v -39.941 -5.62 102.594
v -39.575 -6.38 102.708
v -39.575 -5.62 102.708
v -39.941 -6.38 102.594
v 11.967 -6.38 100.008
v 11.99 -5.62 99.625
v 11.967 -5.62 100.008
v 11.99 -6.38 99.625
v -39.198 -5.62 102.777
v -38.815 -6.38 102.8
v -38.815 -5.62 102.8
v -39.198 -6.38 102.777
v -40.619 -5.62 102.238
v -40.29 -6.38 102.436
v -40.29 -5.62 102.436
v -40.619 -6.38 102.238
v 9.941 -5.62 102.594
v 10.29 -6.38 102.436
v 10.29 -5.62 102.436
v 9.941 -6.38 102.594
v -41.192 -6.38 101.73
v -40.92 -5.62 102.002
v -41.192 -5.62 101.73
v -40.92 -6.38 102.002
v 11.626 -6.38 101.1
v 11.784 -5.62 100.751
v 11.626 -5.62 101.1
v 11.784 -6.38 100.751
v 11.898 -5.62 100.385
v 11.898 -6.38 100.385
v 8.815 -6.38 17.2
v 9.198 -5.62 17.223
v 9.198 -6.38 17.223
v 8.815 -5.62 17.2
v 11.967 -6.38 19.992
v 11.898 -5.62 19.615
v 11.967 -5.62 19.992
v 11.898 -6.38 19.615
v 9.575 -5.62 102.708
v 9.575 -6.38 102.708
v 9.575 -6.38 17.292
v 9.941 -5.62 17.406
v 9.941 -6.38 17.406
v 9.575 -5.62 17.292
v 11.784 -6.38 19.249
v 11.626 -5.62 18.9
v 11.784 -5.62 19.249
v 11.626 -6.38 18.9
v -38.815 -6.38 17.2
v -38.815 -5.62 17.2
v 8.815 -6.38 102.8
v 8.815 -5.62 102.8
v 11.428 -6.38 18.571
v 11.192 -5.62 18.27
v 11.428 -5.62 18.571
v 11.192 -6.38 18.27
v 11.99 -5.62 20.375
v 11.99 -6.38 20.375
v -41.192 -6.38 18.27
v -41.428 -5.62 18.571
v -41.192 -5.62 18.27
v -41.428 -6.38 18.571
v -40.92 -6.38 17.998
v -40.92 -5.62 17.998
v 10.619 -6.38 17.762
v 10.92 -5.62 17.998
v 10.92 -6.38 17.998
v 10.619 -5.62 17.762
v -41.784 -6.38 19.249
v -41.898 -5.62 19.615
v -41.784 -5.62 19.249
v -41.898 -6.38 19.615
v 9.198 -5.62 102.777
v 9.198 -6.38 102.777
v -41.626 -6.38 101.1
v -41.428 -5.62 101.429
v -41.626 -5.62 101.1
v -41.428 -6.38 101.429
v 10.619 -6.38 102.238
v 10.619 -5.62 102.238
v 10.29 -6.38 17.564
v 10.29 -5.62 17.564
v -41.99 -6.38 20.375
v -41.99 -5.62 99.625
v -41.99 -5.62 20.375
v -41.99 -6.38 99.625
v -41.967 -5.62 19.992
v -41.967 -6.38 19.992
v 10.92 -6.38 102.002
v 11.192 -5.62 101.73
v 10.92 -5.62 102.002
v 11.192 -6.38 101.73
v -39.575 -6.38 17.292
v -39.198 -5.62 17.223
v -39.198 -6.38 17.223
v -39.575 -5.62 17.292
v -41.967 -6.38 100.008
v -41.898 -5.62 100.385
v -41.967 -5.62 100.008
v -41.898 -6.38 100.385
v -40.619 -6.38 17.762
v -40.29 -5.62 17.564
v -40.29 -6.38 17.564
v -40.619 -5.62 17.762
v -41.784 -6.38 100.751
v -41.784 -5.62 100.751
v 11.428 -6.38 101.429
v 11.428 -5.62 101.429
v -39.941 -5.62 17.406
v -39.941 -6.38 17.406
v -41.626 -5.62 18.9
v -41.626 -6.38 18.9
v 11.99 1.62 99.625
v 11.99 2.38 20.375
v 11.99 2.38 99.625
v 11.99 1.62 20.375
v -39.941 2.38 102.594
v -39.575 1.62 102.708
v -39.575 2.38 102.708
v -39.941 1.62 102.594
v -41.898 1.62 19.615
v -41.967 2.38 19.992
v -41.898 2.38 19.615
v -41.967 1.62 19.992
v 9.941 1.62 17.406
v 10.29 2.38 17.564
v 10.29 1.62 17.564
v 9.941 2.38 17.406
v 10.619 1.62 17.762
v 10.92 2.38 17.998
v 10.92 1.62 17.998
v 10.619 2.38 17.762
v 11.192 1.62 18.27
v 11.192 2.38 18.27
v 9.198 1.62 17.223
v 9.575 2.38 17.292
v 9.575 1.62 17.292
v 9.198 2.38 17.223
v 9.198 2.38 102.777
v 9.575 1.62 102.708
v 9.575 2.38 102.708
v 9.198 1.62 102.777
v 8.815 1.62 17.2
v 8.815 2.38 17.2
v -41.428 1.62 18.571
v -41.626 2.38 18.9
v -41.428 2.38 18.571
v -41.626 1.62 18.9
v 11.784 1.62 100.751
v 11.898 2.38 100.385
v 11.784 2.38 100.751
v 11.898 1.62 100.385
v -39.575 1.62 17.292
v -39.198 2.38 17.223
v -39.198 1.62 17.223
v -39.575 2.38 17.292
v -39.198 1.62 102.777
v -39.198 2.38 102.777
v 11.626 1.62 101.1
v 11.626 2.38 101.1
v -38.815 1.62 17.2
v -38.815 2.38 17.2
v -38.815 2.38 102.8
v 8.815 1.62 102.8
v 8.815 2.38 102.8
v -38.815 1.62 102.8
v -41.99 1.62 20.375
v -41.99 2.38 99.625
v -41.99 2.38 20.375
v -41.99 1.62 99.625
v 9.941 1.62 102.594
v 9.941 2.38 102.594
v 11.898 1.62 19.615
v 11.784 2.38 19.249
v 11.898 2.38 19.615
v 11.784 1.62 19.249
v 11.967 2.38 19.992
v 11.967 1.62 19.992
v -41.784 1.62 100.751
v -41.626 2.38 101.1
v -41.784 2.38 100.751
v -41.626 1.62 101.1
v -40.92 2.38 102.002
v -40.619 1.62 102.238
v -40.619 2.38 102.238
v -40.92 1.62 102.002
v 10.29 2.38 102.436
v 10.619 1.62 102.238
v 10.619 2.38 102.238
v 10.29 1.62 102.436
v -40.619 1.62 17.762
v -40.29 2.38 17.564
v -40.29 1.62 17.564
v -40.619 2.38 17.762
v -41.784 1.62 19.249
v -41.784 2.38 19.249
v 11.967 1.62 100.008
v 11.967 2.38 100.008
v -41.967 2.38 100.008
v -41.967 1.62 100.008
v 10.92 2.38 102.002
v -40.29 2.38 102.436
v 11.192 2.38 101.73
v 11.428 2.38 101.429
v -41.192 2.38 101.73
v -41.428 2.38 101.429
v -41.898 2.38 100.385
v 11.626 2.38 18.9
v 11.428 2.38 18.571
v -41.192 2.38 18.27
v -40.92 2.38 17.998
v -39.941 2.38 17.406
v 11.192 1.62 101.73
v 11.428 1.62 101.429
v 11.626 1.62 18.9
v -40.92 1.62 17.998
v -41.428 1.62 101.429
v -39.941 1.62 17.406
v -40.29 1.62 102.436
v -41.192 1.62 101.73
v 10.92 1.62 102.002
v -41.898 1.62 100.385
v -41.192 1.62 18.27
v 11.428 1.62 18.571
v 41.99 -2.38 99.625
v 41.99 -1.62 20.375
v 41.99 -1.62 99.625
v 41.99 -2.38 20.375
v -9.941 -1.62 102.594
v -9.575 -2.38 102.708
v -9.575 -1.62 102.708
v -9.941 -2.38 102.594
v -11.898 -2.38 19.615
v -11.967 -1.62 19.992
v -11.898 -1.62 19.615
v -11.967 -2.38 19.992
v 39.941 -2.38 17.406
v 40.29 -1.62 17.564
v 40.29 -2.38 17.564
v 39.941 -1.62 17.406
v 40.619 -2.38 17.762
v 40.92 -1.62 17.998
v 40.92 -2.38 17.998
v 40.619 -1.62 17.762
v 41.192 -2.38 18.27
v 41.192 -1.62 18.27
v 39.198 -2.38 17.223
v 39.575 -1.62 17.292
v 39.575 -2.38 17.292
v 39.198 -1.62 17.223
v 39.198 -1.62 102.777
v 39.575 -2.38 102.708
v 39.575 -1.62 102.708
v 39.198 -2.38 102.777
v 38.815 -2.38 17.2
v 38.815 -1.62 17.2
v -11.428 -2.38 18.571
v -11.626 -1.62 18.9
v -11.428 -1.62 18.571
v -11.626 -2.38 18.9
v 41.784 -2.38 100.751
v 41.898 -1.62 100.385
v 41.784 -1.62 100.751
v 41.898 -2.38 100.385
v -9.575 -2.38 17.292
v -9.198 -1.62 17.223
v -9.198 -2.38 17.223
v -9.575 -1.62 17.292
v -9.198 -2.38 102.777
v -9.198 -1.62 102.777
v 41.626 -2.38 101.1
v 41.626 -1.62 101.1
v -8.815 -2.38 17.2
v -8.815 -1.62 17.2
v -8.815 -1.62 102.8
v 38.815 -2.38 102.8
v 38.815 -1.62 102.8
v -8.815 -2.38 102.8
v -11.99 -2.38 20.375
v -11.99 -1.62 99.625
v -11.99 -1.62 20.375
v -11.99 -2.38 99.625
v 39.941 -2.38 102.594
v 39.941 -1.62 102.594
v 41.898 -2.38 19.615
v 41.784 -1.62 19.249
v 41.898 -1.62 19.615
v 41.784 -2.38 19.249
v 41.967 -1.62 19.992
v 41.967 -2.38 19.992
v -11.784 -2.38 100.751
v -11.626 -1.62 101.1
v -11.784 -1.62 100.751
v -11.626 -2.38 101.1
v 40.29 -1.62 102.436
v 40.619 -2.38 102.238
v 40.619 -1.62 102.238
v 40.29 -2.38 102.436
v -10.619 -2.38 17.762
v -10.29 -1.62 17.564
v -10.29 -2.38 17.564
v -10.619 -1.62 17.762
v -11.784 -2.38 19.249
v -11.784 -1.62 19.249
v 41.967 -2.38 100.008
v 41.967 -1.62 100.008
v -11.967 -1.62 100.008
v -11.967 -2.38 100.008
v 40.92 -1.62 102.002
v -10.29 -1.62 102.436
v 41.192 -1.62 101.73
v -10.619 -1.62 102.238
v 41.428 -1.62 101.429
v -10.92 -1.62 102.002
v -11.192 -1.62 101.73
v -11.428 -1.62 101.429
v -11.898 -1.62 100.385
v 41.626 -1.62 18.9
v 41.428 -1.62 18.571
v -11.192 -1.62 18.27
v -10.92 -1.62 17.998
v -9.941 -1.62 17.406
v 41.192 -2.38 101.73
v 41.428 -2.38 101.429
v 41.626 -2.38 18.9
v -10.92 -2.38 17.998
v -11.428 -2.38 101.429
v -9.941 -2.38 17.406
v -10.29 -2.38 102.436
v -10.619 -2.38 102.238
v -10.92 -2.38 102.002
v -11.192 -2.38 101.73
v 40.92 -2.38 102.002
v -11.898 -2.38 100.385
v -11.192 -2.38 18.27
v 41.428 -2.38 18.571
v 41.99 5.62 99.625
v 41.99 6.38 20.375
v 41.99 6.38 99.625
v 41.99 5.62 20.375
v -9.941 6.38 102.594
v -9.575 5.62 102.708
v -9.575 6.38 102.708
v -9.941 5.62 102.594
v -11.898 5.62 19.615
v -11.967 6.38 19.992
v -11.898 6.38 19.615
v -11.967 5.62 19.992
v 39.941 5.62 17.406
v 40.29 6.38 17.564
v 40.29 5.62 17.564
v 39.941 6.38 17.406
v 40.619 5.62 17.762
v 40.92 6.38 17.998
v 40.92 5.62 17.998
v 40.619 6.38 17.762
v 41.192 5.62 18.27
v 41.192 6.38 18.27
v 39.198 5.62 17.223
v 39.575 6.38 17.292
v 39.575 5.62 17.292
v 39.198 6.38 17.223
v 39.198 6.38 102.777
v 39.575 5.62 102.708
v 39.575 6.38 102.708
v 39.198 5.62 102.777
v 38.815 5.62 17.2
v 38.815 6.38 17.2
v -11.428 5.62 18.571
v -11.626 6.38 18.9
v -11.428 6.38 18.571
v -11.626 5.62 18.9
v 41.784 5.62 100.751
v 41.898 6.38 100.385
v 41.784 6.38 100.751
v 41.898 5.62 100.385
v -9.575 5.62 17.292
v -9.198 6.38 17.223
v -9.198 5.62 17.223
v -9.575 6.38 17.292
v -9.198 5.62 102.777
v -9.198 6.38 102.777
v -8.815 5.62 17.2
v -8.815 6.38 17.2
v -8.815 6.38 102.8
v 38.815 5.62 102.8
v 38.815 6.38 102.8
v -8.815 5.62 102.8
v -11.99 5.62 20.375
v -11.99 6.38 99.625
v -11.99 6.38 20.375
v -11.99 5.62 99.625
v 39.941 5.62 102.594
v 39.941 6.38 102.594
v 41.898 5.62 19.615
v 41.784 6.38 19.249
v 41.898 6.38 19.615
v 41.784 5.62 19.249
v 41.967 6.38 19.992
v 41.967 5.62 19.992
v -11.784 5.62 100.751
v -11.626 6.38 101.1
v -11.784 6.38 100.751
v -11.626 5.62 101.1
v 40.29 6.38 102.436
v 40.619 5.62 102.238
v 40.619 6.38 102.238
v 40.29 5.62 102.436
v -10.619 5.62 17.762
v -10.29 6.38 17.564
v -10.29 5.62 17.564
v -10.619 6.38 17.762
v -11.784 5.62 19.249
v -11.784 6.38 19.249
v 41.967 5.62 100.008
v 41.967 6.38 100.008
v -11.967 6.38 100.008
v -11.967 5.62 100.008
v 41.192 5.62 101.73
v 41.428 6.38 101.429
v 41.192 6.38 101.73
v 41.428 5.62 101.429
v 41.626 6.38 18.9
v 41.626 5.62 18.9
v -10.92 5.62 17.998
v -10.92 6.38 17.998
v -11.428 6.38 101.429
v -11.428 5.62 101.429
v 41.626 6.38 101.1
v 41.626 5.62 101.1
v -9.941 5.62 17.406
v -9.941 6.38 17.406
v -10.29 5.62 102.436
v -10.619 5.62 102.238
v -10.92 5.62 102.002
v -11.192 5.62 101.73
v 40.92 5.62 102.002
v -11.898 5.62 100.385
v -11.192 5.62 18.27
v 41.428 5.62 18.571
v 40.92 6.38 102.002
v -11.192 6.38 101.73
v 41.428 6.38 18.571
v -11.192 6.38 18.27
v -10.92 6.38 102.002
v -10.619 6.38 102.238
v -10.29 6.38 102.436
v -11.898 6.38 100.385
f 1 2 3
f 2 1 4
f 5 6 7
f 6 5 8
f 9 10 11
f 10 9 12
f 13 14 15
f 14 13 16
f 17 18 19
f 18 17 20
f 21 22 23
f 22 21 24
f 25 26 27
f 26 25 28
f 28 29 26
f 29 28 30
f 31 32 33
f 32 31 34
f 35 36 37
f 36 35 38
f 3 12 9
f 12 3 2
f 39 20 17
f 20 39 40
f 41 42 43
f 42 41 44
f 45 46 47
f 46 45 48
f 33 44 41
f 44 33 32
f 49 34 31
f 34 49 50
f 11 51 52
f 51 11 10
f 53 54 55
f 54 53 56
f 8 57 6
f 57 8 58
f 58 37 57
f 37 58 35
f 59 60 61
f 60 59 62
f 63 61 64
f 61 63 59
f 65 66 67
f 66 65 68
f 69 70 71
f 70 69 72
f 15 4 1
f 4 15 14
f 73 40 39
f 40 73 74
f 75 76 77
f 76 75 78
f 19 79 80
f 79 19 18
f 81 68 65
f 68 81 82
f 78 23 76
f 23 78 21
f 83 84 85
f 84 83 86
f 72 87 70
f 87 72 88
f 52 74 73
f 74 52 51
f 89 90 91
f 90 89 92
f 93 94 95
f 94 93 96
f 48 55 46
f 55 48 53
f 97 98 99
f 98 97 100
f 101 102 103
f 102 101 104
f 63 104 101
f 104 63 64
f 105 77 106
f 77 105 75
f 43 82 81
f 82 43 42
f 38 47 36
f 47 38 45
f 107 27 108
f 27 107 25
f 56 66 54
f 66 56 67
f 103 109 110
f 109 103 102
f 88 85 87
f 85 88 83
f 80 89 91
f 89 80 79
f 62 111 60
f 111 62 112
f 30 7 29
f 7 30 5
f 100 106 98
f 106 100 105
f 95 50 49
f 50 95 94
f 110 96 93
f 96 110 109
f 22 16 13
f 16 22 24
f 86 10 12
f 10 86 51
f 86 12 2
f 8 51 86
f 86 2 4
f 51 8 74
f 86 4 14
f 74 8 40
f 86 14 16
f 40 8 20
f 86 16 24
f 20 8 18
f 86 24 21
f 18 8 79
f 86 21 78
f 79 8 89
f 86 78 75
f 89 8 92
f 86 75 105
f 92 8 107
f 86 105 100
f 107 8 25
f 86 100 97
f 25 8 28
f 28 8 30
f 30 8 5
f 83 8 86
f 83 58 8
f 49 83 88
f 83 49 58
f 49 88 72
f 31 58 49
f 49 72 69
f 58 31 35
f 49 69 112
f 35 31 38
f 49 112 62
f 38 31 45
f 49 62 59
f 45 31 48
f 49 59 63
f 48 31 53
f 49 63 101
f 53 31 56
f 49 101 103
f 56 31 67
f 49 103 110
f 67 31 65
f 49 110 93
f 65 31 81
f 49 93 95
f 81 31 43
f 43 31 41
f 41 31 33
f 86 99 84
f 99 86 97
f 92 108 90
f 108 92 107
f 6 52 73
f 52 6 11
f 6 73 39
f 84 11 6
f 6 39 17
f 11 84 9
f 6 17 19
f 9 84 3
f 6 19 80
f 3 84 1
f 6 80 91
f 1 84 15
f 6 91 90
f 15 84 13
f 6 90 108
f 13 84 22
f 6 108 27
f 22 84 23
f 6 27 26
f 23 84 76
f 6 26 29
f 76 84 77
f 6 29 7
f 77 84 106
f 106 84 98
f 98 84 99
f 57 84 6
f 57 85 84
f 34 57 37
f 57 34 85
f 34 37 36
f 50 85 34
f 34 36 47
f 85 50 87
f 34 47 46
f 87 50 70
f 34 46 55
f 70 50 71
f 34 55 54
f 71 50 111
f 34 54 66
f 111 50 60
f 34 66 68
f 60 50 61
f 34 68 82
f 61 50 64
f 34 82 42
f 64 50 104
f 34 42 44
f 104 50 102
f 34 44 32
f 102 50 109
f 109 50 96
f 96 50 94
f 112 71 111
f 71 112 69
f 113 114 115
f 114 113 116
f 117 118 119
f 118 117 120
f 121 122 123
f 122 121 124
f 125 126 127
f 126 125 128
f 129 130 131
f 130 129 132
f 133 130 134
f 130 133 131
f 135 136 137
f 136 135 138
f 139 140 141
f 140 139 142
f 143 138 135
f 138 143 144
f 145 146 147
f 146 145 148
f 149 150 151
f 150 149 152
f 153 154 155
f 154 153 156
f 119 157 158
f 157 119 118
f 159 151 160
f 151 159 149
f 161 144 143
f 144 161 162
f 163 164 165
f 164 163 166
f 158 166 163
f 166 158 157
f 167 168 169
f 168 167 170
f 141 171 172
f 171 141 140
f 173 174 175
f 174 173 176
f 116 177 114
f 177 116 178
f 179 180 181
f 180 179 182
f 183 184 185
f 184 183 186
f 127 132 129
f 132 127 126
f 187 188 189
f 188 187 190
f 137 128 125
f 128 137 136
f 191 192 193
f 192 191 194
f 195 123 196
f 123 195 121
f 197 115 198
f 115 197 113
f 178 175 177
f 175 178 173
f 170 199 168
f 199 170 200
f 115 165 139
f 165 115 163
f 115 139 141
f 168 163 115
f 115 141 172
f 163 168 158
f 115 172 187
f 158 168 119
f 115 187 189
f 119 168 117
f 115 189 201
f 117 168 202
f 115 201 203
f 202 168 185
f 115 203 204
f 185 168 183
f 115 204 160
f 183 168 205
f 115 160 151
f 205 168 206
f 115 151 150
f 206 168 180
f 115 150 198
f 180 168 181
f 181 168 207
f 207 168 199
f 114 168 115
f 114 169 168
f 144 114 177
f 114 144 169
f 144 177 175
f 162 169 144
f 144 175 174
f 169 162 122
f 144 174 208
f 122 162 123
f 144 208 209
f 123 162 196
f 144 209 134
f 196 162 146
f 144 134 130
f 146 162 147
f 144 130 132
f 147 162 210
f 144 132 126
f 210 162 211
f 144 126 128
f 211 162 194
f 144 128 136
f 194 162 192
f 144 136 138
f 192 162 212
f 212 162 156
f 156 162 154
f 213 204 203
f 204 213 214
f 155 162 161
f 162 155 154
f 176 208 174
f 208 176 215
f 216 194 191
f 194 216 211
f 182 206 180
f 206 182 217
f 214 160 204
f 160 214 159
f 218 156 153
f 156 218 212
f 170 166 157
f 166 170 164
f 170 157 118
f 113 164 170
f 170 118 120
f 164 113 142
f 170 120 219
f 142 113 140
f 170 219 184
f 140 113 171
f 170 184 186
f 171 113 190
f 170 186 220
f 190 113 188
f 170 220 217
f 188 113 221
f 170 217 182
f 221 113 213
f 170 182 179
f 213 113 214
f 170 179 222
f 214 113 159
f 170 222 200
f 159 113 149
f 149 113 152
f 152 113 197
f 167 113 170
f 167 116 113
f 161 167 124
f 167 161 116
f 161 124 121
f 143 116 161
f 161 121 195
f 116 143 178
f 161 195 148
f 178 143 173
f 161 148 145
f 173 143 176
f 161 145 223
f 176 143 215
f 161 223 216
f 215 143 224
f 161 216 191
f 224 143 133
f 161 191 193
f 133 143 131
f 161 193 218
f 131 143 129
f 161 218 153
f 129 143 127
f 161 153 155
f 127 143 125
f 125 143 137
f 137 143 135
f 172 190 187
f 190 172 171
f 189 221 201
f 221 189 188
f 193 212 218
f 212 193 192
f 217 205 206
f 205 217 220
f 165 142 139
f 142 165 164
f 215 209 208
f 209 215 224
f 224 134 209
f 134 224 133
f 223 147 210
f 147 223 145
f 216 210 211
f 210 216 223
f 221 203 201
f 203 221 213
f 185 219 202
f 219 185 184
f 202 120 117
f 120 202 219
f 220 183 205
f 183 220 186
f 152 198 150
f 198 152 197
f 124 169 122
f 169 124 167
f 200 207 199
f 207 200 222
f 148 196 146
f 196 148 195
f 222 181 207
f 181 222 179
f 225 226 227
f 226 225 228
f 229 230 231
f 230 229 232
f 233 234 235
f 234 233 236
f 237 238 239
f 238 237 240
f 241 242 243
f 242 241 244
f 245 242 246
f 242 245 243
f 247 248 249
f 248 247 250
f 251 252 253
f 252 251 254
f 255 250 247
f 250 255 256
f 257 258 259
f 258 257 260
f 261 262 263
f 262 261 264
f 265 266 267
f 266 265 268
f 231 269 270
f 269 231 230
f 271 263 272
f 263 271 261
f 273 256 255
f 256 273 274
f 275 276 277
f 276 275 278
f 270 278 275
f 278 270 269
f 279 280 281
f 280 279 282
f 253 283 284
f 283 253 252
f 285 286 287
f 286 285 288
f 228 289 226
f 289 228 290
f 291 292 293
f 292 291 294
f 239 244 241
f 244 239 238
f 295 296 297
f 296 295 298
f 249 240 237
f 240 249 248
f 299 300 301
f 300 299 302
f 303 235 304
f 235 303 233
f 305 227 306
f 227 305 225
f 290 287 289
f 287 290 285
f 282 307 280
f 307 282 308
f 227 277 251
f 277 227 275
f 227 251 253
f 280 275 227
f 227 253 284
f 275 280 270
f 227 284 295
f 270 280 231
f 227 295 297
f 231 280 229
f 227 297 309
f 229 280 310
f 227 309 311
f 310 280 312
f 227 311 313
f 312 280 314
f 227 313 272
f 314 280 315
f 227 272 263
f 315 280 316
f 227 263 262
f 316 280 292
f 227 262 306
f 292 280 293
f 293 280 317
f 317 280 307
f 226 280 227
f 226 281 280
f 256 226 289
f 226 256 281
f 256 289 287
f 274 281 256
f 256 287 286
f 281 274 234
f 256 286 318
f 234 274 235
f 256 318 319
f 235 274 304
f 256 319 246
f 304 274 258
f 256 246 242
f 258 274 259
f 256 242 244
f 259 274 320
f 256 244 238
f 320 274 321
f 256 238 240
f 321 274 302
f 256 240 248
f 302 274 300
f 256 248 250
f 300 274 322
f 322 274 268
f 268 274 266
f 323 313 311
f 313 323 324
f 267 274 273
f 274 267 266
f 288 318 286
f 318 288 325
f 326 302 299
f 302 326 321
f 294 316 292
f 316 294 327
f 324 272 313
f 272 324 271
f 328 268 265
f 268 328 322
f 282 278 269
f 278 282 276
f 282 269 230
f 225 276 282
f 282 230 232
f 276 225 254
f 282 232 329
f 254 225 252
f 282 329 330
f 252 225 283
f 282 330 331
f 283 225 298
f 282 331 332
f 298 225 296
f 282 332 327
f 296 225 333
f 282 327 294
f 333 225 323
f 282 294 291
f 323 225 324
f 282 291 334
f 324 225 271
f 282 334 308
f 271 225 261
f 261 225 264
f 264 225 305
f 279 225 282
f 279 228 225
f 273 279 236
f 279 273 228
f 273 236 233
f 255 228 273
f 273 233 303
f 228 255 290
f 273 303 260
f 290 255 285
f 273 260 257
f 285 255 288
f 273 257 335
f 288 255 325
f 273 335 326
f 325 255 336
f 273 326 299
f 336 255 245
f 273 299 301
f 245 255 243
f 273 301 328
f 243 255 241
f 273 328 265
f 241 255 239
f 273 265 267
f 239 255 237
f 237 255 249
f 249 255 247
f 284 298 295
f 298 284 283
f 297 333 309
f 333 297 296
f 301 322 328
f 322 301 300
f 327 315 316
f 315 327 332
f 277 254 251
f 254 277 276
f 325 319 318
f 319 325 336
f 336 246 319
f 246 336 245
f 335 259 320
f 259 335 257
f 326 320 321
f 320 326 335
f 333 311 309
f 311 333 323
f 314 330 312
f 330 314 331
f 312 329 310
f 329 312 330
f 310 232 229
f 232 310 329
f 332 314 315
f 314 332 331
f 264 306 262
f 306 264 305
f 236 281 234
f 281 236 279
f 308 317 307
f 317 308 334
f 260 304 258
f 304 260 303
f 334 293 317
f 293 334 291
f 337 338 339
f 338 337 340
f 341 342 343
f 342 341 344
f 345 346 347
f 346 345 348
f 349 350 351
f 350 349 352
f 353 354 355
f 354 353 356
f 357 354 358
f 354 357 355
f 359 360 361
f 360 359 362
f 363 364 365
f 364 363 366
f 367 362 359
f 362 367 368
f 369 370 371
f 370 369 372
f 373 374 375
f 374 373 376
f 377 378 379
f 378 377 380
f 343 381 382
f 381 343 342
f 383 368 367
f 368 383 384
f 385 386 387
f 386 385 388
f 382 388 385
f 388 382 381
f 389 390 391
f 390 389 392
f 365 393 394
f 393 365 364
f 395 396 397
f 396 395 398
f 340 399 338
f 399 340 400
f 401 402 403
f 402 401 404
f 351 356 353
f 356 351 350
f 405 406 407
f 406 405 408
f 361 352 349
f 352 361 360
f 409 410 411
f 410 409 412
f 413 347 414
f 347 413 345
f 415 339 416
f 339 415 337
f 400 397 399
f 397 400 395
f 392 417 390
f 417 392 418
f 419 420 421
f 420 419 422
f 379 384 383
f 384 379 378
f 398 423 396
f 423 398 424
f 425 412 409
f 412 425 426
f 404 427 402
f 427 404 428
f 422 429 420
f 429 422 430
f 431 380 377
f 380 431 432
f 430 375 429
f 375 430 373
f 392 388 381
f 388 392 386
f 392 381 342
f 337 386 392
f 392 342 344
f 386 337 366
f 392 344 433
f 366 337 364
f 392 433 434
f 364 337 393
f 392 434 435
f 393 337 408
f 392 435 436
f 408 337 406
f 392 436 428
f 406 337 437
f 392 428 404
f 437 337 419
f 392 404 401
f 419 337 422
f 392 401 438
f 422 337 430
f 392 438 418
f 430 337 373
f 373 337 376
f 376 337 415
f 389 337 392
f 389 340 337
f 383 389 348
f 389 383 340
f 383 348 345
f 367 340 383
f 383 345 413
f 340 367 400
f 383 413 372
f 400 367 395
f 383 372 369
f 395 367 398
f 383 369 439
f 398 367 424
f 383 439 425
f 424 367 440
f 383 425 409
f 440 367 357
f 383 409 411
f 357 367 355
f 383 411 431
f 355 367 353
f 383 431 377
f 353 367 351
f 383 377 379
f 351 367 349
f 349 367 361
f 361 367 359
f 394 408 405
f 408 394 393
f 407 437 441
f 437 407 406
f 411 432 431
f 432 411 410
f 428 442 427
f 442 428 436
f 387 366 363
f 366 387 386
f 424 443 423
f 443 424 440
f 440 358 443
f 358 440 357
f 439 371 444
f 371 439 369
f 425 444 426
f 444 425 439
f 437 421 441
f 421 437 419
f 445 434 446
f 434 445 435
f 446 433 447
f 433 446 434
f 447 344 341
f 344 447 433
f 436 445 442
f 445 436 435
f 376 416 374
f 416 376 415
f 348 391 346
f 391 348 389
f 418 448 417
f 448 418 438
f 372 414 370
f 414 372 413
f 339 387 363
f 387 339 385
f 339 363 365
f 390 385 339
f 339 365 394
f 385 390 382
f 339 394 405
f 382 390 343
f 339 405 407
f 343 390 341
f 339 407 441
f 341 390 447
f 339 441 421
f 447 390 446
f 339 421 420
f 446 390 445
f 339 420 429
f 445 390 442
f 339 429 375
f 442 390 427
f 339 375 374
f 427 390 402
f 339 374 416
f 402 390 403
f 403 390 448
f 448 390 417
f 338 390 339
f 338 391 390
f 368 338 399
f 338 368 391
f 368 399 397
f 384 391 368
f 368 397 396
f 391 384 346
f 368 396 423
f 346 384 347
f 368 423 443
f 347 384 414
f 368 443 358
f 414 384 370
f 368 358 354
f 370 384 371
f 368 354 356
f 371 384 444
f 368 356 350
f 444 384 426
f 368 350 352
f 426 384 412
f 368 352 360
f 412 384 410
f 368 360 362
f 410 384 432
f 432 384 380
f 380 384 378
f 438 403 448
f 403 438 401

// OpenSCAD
$fn=52;

showCards=true;

ovDims=[112.25,18,83];
lowerWidth=100;
lowerHeight=76; //from Top
flankAngle=atan((ovDims.x-lowerWidth)/lowerHeight);
topRad=5;
botWidth=88; //excl. radii
botRad=3;
slotDims=[3.5,8.3];
slotHght=ovDims.z-(ovDims.y-slotDims.y)/2;
cardDist=[30,8];
cardSlotDims=[55,1.3,60];
fudge=0.1;

echo(flankAngle);
if (showCards)
  for (ix=[-1,1],iy=[-1,1]){
    stagger = (ix>0) ? cardDist.y/4 : -cardDist.y/4;
    translate([ix*cardDist.x/2,iy*cardDist.y/2+stagger,60]) rotate([90,90,0]) card(true);
  }
  
%difference(){
  body();
  for (xm=[0,1])
   mirror([xm,0,0]) slot();
}

module slot(){
  
  translate([ovDims.x/2-slotDims.x,0,slotHght])
  rotate([0,flankAngle/2,0])
    translate([slotDims.x/2,0,-slotHght]) linear_extrude(slotHght) square(slotDims,true);
}

module body(){

  difference(){
   mainBody();
   translate([0,0,ovDims.z-topRad]) linear_extrude(topRad+fudge) square([ovDims.x,ovDims.y+fudge],true);
  }

  //top rounding
  intersection(){
    hull(){
      translate([0,ovDims.y/2-topRad,ovDims.z-topRad]) rotate([0,90,0]) cylinder(r=topRad,h=ovDims.x,center=true);
      translate([0,-ovDims.y/2+topRad,ovDims.z-topRad]) rotate([0,90,0]) cylinder(r=topRad,h=ovDims.x,center=true);
    }
    mainBody();
  }
  
  //bottom part
  hull(){
    translate([0,0,ovDims.z-lowerHeight]) linear_extrude(0.1) mirror([0,0,1]) square([lowerWidth,ovDims.y],true);
    for (ix=[-1,1])
      translate([ix*botWidth/2,0,botRad]) rotate([90,0,0]) cylinder(r=botRad,h=ovDims.y,center=true);
  }
    
  module mainBody(){
    sFac=ovDims.x/lowerWidth;
    translate([0,0,ovDims.z-lowerHeight]) linear_extrude(lowerHeight,scale=[sFac,1]) square([lowerWidth,ovDims.y],true);
  }
}

*card();
module card(center=false){
  ovDims=[85.6,53.98,0.76];
  crnrRad=3.175;
  cntrOffset= center ? [0,0,0] : ovDims/2;
  translate(cntrOffset) 
    linear_extrude(ovDims.z,center=true)  
      hull() for (ix=[-1,1],iy=[-1,1])
        translate([ix*(ovDims.x/2-crnrRad),iy*(ovDims.y/2-crnrRad)]) circle(crnrRad);
}
